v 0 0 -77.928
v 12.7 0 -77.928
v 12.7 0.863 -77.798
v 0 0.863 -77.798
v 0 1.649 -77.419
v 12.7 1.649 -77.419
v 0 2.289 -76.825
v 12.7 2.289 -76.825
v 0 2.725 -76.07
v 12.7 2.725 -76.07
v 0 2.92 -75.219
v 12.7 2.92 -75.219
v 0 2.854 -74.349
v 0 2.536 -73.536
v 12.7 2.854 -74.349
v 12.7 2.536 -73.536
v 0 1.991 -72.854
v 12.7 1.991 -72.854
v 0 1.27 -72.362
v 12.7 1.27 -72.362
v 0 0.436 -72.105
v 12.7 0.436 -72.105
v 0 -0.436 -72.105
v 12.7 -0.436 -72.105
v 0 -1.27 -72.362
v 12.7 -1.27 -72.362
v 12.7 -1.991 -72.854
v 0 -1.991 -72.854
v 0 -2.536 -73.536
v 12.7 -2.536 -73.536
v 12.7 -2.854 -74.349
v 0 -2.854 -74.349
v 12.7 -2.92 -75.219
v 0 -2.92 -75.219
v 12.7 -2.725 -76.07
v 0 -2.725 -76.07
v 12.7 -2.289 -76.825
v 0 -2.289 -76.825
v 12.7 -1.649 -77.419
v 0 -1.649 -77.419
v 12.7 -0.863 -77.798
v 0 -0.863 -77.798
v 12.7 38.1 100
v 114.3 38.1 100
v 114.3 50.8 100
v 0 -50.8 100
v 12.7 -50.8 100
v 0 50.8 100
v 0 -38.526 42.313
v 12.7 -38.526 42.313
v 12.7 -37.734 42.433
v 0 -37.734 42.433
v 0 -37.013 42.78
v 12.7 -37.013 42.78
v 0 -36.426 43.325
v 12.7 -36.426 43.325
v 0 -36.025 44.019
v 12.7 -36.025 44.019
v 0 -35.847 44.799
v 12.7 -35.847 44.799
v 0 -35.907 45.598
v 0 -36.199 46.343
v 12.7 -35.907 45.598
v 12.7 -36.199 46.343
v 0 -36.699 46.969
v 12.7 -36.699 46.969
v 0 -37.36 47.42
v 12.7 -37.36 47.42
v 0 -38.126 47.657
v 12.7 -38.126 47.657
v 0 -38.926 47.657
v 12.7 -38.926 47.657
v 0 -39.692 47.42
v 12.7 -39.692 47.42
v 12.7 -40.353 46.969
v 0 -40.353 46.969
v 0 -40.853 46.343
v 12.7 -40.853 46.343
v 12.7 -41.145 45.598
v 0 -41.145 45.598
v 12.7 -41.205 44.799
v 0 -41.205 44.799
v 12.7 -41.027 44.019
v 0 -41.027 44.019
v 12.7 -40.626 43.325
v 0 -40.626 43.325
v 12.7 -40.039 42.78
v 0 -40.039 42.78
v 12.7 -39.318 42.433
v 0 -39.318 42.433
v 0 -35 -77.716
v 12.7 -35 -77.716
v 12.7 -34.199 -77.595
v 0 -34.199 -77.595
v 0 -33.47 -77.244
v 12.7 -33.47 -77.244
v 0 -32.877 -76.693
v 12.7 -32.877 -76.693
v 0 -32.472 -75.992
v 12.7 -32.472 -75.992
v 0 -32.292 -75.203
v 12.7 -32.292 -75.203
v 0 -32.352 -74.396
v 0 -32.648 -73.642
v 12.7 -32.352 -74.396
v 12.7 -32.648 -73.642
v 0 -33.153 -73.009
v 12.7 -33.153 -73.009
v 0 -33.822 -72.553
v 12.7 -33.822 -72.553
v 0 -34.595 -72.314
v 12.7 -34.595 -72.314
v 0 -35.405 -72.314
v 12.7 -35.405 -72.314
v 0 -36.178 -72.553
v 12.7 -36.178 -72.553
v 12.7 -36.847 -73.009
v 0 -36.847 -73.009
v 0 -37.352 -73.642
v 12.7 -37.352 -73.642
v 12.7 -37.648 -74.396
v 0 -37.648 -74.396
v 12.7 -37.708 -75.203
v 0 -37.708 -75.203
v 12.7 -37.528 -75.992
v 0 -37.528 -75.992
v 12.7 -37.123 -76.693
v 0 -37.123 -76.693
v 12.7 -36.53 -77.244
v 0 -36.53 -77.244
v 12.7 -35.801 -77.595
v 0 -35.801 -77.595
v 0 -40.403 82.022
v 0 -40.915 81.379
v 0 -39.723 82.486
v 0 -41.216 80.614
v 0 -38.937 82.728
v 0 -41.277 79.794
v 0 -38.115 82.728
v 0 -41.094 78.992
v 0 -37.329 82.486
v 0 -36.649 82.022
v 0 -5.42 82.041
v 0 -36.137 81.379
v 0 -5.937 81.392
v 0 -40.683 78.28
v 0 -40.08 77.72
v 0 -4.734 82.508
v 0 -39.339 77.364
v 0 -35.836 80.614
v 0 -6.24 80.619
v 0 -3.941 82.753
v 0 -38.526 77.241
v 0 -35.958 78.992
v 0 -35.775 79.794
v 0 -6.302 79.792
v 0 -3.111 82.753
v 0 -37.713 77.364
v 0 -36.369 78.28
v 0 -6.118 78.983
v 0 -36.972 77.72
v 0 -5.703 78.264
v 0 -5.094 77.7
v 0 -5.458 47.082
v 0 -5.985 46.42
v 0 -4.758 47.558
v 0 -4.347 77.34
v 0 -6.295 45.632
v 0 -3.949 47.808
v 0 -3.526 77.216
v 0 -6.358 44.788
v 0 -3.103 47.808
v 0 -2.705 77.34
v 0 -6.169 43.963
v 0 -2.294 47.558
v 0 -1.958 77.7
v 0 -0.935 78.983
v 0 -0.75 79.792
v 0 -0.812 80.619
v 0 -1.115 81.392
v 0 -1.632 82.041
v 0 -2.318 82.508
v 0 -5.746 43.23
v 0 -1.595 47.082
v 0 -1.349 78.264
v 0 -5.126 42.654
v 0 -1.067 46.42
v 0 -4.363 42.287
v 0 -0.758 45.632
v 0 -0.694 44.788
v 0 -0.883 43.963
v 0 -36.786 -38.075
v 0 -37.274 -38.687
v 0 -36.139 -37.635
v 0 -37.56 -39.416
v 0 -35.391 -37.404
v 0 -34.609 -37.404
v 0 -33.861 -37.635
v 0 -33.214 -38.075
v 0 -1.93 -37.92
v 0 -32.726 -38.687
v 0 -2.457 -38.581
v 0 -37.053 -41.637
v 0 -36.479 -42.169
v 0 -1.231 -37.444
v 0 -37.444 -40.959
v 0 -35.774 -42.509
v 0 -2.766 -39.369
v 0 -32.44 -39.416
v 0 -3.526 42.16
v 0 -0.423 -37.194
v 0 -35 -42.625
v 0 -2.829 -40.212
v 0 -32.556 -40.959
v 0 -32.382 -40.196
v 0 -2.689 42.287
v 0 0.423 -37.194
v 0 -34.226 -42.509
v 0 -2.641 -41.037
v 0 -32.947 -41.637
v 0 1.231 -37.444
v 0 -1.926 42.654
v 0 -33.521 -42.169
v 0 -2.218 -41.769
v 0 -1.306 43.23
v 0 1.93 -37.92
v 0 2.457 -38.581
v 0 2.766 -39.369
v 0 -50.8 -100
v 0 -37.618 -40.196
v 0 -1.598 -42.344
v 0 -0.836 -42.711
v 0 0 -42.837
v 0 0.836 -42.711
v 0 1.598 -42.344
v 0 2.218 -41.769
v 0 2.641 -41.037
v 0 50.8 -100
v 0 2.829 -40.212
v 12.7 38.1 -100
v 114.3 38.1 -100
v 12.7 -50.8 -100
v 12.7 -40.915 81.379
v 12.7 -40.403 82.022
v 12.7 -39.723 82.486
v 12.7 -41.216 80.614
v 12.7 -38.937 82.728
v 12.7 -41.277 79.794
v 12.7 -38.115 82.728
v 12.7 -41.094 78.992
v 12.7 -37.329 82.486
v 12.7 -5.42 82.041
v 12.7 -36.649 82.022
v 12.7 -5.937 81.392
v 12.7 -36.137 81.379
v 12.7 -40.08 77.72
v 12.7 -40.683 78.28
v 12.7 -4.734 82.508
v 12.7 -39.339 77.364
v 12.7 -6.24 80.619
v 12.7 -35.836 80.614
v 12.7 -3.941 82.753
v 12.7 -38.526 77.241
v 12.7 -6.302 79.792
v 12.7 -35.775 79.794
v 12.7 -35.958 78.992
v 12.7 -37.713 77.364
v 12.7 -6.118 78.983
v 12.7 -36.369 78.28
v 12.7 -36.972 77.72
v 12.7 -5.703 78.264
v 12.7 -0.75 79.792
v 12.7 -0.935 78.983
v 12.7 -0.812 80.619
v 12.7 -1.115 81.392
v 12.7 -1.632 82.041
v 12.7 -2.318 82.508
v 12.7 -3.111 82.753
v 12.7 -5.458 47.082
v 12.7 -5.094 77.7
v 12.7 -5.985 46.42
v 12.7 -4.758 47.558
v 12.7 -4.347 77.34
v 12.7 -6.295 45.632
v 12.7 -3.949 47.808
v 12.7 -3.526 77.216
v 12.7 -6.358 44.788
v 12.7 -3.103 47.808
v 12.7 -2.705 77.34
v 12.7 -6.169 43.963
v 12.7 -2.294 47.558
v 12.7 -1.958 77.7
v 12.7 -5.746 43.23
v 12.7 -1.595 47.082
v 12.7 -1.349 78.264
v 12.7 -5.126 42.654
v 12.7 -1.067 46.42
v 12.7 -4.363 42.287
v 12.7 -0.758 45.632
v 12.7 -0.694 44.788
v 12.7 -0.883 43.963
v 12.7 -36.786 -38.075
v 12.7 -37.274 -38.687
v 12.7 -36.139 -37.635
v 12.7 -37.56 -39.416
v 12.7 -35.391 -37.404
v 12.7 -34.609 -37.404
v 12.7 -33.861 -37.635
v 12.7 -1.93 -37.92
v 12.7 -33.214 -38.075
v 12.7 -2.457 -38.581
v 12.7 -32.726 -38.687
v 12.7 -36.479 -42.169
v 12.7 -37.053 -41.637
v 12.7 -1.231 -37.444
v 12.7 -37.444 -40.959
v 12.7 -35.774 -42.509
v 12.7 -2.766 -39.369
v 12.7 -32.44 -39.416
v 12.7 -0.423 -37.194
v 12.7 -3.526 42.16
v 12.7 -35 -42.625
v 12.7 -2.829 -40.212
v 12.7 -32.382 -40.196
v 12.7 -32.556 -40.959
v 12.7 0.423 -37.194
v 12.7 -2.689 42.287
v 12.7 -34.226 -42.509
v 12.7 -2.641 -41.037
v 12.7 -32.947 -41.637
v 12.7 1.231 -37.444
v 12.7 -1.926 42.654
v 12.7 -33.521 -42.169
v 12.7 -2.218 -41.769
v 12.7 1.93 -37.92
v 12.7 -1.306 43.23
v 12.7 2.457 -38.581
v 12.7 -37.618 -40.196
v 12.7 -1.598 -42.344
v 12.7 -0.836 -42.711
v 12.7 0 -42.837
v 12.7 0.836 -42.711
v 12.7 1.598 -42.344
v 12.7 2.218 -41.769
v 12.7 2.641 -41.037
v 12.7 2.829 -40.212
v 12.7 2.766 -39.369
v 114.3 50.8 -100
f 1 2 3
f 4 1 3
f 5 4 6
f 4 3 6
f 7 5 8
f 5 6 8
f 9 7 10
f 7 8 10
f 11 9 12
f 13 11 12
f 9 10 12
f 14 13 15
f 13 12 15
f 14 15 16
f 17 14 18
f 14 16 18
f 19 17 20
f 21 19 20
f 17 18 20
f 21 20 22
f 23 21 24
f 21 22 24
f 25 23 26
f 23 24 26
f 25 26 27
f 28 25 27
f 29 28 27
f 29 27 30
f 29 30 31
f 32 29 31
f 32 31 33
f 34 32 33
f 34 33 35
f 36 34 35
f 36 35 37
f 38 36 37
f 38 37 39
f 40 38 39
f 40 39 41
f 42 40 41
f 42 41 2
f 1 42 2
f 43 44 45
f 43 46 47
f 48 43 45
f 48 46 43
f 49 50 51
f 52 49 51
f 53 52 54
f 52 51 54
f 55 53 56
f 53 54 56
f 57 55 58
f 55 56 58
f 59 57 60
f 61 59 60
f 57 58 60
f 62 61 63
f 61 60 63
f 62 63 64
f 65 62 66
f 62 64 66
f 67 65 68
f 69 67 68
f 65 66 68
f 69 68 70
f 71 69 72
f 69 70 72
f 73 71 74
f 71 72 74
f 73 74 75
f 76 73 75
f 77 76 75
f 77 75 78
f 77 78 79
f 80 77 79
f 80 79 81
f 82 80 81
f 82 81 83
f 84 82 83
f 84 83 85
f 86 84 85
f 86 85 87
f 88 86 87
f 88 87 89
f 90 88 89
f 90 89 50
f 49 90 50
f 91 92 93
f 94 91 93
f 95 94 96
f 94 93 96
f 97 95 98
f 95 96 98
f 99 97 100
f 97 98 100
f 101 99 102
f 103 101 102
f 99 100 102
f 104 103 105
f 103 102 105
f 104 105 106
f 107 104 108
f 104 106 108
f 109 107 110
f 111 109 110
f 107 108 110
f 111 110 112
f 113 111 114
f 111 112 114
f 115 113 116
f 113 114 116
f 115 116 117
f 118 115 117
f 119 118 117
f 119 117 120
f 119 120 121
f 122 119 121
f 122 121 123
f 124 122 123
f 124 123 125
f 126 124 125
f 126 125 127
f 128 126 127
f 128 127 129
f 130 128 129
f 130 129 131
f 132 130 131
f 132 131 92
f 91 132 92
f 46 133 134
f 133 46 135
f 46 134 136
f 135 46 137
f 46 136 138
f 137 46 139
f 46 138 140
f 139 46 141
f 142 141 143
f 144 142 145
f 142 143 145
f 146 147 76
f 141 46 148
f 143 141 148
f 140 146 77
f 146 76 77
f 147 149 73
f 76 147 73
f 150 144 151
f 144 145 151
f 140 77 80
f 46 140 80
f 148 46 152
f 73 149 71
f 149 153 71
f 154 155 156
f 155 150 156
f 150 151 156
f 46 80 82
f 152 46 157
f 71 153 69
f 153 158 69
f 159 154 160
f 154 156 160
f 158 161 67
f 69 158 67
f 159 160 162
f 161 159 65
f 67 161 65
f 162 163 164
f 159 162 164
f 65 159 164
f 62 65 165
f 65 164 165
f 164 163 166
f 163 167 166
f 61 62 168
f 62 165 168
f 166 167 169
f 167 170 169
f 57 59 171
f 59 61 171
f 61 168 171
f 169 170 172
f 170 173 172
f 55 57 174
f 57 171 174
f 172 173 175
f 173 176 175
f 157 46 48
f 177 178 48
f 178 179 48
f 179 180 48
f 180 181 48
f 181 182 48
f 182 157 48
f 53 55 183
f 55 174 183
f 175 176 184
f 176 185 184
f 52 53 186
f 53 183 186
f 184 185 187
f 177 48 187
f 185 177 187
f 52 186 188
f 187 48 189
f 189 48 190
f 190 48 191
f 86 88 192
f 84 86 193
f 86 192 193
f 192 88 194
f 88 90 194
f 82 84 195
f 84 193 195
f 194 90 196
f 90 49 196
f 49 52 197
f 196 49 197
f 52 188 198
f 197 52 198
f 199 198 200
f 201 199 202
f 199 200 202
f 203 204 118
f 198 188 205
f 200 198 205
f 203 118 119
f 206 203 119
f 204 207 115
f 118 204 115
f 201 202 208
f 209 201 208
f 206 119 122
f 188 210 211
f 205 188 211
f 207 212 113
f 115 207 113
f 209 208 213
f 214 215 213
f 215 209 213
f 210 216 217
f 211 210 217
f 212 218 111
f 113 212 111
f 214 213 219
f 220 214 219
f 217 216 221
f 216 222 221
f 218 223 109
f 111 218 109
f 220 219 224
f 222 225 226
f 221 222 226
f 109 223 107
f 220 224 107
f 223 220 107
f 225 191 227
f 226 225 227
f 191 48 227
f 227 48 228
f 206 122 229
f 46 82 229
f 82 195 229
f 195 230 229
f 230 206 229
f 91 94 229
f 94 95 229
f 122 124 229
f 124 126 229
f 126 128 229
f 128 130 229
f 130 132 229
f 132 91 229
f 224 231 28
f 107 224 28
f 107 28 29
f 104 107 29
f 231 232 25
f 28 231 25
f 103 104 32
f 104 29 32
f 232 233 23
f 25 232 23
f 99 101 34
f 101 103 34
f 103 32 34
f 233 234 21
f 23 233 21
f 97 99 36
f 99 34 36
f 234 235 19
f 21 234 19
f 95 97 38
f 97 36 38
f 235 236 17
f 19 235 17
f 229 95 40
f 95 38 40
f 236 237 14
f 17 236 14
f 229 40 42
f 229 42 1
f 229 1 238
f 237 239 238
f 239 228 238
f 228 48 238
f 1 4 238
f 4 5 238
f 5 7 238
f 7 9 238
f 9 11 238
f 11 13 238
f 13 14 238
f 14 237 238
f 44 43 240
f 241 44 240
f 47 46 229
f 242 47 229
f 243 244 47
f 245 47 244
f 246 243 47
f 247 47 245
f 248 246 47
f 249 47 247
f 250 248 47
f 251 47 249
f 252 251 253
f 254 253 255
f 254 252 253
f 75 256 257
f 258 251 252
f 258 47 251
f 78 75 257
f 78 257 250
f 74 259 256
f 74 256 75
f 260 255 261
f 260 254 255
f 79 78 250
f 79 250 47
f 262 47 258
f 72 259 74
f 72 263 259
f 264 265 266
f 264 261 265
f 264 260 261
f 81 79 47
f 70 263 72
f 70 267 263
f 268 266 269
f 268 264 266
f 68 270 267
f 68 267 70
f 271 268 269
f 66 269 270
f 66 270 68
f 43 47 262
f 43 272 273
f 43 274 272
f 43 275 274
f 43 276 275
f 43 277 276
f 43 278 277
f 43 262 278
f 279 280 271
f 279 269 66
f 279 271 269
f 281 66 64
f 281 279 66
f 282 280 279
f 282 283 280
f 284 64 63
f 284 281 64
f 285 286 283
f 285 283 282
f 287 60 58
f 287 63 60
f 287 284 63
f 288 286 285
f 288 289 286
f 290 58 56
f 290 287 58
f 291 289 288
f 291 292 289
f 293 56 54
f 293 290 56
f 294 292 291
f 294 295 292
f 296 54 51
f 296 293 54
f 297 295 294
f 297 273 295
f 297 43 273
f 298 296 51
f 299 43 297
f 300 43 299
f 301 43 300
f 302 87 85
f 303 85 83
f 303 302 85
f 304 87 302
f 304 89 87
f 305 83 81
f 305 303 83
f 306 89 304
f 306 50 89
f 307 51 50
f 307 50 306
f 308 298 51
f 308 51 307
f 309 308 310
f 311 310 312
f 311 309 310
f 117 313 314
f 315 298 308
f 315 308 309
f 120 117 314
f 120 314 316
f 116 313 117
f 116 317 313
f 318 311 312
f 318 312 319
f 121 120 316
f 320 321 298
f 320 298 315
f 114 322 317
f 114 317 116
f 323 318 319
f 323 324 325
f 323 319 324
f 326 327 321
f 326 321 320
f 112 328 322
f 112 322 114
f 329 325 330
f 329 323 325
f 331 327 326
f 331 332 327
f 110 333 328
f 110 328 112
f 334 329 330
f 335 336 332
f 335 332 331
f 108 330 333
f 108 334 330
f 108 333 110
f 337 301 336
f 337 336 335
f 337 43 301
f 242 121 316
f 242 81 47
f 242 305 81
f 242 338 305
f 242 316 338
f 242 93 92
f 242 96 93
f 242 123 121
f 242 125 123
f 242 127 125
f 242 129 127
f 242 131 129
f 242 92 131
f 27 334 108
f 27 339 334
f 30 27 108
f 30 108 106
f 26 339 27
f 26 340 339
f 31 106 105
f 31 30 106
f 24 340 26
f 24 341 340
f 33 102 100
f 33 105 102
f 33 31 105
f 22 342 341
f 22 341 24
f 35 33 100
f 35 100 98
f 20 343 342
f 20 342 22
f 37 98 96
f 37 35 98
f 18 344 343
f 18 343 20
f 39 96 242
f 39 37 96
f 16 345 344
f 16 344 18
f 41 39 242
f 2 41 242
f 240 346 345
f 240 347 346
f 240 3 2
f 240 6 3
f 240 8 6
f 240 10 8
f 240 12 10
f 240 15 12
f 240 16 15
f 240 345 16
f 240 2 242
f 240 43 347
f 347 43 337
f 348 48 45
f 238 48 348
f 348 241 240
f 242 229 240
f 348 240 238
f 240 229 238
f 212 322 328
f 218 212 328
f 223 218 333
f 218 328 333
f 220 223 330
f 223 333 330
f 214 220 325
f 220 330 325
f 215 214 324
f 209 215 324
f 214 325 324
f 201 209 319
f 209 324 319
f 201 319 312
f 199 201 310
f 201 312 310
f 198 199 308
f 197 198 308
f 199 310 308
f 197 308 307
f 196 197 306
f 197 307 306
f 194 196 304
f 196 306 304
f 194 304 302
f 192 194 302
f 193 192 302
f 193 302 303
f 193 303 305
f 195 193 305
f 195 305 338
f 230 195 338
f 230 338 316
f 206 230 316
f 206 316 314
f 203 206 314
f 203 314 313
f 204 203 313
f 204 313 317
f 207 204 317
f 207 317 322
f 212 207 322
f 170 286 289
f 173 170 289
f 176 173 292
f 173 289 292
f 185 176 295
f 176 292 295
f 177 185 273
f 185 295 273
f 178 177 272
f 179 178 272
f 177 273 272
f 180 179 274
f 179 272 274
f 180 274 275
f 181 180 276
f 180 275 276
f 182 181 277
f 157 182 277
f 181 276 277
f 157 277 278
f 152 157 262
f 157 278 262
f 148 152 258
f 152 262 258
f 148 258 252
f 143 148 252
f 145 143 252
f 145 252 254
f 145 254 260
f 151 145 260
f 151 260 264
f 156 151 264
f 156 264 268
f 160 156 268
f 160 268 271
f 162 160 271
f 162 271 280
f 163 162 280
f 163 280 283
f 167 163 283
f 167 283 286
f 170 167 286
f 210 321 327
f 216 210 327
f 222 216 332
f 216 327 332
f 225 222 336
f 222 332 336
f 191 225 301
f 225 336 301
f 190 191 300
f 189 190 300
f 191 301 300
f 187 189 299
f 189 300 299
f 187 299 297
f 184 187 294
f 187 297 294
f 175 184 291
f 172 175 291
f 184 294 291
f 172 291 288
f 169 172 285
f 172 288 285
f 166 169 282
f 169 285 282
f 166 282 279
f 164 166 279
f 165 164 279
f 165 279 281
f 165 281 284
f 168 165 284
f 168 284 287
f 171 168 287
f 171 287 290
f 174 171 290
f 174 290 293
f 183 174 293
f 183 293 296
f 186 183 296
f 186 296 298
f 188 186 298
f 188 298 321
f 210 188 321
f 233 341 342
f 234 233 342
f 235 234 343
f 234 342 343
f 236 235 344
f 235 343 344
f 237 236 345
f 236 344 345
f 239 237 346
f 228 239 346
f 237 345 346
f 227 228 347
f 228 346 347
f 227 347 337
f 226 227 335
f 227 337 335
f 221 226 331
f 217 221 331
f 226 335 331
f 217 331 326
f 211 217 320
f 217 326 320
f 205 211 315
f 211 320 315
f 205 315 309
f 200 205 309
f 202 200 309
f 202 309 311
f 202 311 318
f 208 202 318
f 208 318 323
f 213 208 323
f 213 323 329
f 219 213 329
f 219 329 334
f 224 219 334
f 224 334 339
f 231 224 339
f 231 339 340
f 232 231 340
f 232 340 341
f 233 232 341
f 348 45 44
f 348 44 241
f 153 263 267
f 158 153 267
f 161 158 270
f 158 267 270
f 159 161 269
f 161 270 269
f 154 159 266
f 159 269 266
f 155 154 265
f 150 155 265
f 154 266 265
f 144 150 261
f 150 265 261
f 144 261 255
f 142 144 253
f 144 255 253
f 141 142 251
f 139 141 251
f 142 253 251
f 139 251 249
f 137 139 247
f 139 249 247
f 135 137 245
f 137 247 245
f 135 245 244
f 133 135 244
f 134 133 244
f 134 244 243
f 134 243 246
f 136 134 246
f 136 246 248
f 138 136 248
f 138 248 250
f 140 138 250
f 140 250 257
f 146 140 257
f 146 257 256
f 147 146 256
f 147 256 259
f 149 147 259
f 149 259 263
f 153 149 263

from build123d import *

# Parameters (mm, degrees)
CROQUIS1_W              = 200
CROQUIS1_H              = 101.6
SALIENTE_EXTRUIR1_DEPTH = 12.7
CROQUIS2_W              = 200
CROQUIS2_H              = 12.7
SALIENTE_EXTRUIR2_DEPTH = 101.6
CROQUIS3_R              = 2.783946769
CROQUIS3_R_2            = 2.839641003
CROQUIS3_R_3            = 2.758984083
CROQUIS3_R_4            = 2.686508842
CROQUIS3_R_5            = 2.837304272
CROQUIS3_R_6            = 2.927811787
CROQUIS3_R_7            = 2.625457287
CROQUIS3_R_8            = 2.715964801
CORTAR_EXTRUIR1_DEPTH   = 101.6


with BuildPart() as part:
    # Croquis1 → Saliente-Extruir1 (new body)
    with BuildSketch(Plane(origin=(0, 0, 0), x_dir=(0, 0, -1), z_dir=(1, 0, 0))):
        Rectangle(CROQUIS1_W, CROQUIS1_H)
    extrude(amount=SALIENTE_EXTRUIR1_DEPTH)

    # Croquis2 → Saliente-Extruir2 (add)
    with BuildSketch(Plane(origin=(12.7, 0, 0), x_dir=(0, 0, -1), z_dir=(1, 0, 0))):
        with Locations((0, 44.45)):
            Rectangle(CROQUIS2_W, CROQUIS2_H)
    extrude(amount=SALIENTE_EXTRUIR2_DEPTH)

    # Croquis3 → Cortar-Extruir1 (cut)
    with BuildSketch(Plane(origin=(12.7, 0, 0), x_dir=(0, 0, -1), z_dir=(1, 0, 0))):
        with Locations((-80, -3.526056283)):
            Circle(CROQUIS3_R)
        with Locations((-45, -3.526056283)):
            Circle(CROQUIS3_R_2)
        with Locations((-80, -38.526056283)):
            Circle(CROQUIS3_R_3)
        with Locations((-45, -38.526056283)):
            Circle(CROQUIS3_R_4)
        with Locations((40, 0)):
            Circle(CROQUIS3_R_5)
        with Locations((75, 0)):
            Circle(CROQUIS3_R_6)
        with Locations((40, -35)):
            Circle(CROQUIS3_R_7)
        with Locations((75, -35)):
            Circle(CROQUIS3_R_8)
    extrude(amount=-CORTAR_EXTRUIR1_DEPTH, mode=Mode.SUBTRACT)


solid = part.part
